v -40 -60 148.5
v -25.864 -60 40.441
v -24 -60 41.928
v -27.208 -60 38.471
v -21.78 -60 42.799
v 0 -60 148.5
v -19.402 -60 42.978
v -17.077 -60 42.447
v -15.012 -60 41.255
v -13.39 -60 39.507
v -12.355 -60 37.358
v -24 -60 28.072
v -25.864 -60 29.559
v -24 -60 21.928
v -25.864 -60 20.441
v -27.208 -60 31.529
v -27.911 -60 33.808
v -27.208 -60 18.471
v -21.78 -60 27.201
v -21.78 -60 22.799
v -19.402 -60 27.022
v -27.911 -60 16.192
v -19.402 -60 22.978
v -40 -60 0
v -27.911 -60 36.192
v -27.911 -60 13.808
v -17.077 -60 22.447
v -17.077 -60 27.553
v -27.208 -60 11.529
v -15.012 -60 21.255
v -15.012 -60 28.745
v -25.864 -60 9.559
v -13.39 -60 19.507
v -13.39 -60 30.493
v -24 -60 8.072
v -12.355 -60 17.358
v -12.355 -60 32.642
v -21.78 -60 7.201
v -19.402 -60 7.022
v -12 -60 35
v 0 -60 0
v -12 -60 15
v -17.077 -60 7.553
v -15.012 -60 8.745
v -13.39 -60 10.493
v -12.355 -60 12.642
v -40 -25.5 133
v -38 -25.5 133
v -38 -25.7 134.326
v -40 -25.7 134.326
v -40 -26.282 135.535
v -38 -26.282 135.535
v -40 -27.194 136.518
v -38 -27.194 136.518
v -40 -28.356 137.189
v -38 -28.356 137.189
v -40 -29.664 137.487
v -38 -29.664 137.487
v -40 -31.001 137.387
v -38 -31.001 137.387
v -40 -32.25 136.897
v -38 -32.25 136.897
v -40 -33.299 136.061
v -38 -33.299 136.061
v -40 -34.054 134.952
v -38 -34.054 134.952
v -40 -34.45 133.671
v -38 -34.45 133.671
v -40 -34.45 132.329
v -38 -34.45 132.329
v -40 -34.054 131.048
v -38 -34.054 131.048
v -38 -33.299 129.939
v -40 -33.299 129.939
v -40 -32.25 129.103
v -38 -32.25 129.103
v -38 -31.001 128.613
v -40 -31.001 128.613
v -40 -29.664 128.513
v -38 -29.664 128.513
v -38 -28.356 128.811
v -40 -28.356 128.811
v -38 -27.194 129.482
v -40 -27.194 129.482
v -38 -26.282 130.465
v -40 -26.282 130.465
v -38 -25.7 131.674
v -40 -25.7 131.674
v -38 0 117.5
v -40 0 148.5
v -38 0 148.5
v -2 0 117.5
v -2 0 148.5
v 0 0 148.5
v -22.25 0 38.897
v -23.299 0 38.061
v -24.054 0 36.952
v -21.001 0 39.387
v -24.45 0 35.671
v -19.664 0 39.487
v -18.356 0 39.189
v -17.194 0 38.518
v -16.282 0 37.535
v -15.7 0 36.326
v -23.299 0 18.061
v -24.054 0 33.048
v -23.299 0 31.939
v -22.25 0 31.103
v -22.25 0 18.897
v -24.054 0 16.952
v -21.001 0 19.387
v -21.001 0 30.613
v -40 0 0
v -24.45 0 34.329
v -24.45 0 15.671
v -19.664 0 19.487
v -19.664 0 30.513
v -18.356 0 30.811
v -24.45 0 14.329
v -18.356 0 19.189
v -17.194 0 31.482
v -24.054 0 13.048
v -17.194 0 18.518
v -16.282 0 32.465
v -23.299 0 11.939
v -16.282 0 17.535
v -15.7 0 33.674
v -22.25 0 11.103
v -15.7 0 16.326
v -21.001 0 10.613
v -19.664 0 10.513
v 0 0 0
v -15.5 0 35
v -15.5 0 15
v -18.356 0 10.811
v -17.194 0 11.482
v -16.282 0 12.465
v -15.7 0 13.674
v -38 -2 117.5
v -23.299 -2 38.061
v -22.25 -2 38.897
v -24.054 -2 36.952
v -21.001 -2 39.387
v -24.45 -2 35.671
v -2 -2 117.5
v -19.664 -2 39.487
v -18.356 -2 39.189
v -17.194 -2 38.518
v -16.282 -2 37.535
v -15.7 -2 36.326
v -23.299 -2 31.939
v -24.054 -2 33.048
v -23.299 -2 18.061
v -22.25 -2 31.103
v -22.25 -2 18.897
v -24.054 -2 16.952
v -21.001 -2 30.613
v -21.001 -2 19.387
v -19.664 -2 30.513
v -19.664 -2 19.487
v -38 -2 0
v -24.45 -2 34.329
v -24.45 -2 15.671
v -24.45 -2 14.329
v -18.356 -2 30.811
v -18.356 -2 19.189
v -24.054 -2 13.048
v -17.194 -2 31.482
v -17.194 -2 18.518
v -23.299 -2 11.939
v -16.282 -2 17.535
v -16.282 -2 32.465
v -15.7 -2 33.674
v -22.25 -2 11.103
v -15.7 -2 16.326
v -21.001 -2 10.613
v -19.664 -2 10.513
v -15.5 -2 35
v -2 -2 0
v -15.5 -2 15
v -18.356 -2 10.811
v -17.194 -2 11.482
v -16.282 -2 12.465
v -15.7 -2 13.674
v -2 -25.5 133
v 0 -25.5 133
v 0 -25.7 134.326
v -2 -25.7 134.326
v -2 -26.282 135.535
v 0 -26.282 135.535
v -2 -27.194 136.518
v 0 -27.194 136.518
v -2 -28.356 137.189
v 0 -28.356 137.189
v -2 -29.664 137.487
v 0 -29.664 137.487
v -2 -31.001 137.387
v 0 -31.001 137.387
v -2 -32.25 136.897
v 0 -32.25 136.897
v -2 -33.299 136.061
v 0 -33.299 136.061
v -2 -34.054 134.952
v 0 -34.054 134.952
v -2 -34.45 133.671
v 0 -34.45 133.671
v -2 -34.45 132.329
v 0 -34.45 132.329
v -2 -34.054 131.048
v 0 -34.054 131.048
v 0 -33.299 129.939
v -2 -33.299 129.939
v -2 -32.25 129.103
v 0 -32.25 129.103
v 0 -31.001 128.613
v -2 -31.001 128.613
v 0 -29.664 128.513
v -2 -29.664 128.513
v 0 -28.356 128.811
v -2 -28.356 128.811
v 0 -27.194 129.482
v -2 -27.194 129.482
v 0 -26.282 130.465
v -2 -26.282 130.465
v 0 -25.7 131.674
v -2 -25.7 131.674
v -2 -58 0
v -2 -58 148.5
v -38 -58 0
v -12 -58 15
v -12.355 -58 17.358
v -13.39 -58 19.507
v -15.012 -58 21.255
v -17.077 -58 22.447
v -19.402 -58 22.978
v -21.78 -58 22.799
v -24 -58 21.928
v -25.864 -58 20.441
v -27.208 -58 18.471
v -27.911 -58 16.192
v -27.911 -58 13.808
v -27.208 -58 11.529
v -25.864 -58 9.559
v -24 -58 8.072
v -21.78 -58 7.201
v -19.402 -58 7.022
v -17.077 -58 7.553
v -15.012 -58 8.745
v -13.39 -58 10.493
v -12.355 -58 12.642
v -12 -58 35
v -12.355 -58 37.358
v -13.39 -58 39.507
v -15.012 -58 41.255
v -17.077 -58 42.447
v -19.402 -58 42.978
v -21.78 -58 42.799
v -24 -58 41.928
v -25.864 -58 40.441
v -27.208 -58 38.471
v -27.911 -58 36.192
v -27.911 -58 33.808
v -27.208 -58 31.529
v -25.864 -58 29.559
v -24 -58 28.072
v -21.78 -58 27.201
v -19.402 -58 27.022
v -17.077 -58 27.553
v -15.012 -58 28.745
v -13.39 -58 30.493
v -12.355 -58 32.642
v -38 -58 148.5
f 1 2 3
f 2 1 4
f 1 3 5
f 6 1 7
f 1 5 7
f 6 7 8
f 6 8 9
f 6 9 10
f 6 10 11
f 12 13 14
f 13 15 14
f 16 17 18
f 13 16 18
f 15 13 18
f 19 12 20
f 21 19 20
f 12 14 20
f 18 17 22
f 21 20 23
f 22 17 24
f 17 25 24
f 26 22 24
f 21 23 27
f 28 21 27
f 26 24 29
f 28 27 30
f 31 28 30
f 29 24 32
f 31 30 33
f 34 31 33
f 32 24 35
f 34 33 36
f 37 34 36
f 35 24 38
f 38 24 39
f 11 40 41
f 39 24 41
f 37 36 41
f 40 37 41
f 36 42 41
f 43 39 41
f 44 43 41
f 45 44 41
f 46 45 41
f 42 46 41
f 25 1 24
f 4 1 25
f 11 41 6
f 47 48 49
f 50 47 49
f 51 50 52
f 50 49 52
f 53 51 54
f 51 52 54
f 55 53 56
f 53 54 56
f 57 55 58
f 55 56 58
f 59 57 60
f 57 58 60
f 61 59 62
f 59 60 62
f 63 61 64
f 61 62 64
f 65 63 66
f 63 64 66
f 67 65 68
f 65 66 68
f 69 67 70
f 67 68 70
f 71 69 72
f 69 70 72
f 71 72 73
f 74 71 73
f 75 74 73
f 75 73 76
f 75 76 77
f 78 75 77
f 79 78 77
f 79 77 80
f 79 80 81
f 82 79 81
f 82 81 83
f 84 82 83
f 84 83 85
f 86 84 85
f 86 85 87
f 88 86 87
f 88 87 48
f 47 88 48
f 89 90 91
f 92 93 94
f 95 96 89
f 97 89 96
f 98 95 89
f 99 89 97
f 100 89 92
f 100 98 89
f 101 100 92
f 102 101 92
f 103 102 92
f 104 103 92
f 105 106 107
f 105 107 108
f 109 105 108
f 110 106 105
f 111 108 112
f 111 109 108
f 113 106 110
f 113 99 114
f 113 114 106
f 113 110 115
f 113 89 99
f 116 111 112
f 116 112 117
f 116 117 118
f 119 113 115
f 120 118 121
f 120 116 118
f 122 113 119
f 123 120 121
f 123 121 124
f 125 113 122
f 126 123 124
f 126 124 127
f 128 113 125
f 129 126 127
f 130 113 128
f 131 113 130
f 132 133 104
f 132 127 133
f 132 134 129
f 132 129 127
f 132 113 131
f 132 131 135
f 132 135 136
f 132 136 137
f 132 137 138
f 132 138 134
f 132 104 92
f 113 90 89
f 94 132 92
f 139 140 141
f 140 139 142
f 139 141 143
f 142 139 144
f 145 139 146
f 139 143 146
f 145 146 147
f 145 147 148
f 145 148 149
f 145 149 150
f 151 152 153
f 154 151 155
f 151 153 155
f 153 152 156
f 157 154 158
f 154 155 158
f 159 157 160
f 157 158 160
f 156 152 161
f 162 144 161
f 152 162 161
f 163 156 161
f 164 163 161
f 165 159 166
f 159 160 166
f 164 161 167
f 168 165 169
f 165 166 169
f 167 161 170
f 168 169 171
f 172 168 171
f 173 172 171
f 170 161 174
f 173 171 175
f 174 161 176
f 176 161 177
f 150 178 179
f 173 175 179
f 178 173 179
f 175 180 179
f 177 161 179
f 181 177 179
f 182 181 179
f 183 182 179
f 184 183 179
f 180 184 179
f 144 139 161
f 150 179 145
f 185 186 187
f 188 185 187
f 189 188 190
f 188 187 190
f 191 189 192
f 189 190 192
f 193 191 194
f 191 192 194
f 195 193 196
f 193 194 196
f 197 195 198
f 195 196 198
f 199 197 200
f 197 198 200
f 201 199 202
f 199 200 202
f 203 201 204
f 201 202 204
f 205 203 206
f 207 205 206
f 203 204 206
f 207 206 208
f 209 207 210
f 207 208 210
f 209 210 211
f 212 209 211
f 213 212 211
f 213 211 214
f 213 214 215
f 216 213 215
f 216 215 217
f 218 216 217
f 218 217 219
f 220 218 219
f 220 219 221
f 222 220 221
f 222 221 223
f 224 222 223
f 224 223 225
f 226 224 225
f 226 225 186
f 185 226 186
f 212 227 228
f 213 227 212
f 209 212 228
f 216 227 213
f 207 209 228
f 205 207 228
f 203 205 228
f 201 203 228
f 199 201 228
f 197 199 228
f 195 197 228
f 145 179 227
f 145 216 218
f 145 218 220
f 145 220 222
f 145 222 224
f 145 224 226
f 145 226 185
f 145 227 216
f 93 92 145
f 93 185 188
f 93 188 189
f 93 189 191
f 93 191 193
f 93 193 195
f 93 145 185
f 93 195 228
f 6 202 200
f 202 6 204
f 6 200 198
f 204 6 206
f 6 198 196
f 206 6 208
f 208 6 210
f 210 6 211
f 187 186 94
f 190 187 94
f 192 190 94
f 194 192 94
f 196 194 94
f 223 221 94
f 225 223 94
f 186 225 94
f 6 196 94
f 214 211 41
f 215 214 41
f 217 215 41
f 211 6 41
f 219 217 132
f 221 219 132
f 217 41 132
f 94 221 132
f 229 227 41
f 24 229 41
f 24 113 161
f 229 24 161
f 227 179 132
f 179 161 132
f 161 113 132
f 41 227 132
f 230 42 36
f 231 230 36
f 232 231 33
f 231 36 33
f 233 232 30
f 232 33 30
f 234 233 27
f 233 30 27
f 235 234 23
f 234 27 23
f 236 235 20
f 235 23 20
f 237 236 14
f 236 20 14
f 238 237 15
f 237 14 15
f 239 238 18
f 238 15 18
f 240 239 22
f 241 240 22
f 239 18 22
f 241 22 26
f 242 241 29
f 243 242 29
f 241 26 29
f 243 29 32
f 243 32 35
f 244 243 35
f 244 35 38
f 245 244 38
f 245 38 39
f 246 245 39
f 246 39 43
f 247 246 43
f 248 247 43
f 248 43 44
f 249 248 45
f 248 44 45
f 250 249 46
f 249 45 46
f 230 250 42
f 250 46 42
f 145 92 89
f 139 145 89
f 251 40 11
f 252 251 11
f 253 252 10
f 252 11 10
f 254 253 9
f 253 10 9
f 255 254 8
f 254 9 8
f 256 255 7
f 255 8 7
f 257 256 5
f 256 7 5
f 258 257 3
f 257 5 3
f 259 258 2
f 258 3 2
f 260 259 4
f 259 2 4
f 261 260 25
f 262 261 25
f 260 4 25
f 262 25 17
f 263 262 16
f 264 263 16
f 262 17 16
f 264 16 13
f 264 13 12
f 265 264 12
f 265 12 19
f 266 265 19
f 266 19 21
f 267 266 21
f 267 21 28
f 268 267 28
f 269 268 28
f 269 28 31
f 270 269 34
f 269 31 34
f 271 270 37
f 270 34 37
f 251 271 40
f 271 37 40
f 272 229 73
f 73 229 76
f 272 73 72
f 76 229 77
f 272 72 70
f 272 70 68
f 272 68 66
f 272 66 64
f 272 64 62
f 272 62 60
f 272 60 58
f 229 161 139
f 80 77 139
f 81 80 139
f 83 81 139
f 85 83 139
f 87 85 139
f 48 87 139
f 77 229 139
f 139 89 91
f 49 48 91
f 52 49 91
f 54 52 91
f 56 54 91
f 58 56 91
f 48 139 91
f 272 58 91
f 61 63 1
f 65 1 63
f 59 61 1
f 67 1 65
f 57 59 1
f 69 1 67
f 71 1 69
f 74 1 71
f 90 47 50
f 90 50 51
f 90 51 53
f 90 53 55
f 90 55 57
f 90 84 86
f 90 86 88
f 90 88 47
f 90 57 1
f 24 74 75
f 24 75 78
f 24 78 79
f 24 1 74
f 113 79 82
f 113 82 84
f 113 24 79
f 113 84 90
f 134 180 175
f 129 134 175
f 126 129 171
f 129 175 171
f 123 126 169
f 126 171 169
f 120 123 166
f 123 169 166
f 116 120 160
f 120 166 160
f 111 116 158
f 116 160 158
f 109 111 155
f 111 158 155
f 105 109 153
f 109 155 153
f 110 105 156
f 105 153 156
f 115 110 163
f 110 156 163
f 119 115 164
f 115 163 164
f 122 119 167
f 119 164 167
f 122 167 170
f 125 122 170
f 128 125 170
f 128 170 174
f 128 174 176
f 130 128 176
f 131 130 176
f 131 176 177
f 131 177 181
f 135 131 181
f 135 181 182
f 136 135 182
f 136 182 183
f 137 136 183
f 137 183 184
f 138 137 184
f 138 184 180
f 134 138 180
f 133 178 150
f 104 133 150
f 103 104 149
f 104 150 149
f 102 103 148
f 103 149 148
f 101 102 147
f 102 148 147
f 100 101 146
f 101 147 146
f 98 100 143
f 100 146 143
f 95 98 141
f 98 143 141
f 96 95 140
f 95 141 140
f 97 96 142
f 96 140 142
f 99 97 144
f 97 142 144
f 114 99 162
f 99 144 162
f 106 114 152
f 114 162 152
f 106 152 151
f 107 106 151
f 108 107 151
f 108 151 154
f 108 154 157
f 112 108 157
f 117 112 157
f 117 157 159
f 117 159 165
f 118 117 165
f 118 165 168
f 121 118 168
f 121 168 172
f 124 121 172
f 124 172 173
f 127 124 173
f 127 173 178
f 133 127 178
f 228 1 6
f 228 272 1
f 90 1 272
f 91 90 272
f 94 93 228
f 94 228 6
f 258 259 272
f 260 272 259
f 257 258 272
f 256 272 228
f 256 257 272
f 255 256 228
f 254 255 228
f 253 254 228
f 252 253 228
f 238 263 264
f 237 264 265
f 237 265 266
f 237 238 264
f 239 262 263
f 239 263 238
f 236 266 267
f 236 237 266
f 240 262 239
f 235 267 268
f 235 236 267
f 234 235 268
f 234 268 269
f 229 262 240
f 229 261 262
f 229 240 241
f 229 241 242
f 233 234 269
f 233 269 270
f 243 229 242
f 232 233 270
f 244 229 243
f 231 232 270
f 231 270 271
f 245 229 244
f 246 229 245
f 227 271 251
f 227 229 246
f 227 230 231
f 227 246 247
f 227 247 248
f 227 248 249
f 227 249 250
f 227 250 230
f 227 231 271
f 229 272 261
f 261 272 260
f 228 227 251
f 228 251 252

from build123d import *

# Parameters (mm, degrees)
F2_W      = 40
F2_H      = 60
F3_DEPTH  = 148.5
F4_T      = -2
F5_W      = 36
F5_H      = 31
F6_DEPTH  = 2
F7_R      = 4.5
F8_DEPTH  = 40.001
F9_R      = 4.5
F10_DEPTH = 60.001
F9_R_2    = 8
F11_DEPTH = 2


with BuildPart() as f3:
    # F2 (on Top) → F3 (new body)
    with BuildSketch(Plane.XY):
        with Locations((-20, -30)):
            Rectangle(F2_W, F2_H)
    extrude(amount=F3_DEPTH)

    # F4
    f4_openings = [f3.faces().sort_by_distance(p)[0] for p in [
        (-20, -30, 148.5),
        (-20, -30, 0),
    ]]
    offset(amount=F4_T, openings=f4_openings)

    # F5 (on face) → F6 (cut, through all)
    with BuildSketch(Plane(origin=(0, 0, 0), x_dir=(-1, 0, 0), z_dir=(0, 1, 0))):
        with Locations((20, 133)):
            Rectangle(F5_W, F5_H)
    extrude(amount=-F6_DEPTH, mode=Mode.SUBTRACT)

    # F7 (on Right) → F8 (cut, through all)
    with BuildSketch(Plane.YZ):
        with Locations((-30, 133)):
            Circle(F7_R)
    extrude(amount=-F8_DEPTH, mode=Mode.SUBTRACT)

    # F9 (on face) → F10 (cut, through all)
    with BuildSketch(Plane.XZ.offset(60)):
        with Locations((-20, 35)):
            Circle(F9_R)
        with Locations((-20, 15)):
            Circle(F9_R)
    extrude(amount=-F10_DEPTH, mode=Mode.SUBTRACT)

    # F9 (on face) → F11 (cut, through all)
    with BuildSketch(Plane.XZ.offset(60)):
        with Locations((-20, 35)):
            Circle(F9_R_2)
        with Locations((-20, 35)):
            Circle(F9_R, mode=Mode.SUBTRACT)
        with Locations((-20, 15)):
            Circle(F9_R_2)
        with Locations((-20, 15)):
            Circle(F9_R, mode=Mode.SUBTRACT)
    extrude(amount=-F11_DEPTH, mode=Mode.SUBTRACT)


solid = f3.part
